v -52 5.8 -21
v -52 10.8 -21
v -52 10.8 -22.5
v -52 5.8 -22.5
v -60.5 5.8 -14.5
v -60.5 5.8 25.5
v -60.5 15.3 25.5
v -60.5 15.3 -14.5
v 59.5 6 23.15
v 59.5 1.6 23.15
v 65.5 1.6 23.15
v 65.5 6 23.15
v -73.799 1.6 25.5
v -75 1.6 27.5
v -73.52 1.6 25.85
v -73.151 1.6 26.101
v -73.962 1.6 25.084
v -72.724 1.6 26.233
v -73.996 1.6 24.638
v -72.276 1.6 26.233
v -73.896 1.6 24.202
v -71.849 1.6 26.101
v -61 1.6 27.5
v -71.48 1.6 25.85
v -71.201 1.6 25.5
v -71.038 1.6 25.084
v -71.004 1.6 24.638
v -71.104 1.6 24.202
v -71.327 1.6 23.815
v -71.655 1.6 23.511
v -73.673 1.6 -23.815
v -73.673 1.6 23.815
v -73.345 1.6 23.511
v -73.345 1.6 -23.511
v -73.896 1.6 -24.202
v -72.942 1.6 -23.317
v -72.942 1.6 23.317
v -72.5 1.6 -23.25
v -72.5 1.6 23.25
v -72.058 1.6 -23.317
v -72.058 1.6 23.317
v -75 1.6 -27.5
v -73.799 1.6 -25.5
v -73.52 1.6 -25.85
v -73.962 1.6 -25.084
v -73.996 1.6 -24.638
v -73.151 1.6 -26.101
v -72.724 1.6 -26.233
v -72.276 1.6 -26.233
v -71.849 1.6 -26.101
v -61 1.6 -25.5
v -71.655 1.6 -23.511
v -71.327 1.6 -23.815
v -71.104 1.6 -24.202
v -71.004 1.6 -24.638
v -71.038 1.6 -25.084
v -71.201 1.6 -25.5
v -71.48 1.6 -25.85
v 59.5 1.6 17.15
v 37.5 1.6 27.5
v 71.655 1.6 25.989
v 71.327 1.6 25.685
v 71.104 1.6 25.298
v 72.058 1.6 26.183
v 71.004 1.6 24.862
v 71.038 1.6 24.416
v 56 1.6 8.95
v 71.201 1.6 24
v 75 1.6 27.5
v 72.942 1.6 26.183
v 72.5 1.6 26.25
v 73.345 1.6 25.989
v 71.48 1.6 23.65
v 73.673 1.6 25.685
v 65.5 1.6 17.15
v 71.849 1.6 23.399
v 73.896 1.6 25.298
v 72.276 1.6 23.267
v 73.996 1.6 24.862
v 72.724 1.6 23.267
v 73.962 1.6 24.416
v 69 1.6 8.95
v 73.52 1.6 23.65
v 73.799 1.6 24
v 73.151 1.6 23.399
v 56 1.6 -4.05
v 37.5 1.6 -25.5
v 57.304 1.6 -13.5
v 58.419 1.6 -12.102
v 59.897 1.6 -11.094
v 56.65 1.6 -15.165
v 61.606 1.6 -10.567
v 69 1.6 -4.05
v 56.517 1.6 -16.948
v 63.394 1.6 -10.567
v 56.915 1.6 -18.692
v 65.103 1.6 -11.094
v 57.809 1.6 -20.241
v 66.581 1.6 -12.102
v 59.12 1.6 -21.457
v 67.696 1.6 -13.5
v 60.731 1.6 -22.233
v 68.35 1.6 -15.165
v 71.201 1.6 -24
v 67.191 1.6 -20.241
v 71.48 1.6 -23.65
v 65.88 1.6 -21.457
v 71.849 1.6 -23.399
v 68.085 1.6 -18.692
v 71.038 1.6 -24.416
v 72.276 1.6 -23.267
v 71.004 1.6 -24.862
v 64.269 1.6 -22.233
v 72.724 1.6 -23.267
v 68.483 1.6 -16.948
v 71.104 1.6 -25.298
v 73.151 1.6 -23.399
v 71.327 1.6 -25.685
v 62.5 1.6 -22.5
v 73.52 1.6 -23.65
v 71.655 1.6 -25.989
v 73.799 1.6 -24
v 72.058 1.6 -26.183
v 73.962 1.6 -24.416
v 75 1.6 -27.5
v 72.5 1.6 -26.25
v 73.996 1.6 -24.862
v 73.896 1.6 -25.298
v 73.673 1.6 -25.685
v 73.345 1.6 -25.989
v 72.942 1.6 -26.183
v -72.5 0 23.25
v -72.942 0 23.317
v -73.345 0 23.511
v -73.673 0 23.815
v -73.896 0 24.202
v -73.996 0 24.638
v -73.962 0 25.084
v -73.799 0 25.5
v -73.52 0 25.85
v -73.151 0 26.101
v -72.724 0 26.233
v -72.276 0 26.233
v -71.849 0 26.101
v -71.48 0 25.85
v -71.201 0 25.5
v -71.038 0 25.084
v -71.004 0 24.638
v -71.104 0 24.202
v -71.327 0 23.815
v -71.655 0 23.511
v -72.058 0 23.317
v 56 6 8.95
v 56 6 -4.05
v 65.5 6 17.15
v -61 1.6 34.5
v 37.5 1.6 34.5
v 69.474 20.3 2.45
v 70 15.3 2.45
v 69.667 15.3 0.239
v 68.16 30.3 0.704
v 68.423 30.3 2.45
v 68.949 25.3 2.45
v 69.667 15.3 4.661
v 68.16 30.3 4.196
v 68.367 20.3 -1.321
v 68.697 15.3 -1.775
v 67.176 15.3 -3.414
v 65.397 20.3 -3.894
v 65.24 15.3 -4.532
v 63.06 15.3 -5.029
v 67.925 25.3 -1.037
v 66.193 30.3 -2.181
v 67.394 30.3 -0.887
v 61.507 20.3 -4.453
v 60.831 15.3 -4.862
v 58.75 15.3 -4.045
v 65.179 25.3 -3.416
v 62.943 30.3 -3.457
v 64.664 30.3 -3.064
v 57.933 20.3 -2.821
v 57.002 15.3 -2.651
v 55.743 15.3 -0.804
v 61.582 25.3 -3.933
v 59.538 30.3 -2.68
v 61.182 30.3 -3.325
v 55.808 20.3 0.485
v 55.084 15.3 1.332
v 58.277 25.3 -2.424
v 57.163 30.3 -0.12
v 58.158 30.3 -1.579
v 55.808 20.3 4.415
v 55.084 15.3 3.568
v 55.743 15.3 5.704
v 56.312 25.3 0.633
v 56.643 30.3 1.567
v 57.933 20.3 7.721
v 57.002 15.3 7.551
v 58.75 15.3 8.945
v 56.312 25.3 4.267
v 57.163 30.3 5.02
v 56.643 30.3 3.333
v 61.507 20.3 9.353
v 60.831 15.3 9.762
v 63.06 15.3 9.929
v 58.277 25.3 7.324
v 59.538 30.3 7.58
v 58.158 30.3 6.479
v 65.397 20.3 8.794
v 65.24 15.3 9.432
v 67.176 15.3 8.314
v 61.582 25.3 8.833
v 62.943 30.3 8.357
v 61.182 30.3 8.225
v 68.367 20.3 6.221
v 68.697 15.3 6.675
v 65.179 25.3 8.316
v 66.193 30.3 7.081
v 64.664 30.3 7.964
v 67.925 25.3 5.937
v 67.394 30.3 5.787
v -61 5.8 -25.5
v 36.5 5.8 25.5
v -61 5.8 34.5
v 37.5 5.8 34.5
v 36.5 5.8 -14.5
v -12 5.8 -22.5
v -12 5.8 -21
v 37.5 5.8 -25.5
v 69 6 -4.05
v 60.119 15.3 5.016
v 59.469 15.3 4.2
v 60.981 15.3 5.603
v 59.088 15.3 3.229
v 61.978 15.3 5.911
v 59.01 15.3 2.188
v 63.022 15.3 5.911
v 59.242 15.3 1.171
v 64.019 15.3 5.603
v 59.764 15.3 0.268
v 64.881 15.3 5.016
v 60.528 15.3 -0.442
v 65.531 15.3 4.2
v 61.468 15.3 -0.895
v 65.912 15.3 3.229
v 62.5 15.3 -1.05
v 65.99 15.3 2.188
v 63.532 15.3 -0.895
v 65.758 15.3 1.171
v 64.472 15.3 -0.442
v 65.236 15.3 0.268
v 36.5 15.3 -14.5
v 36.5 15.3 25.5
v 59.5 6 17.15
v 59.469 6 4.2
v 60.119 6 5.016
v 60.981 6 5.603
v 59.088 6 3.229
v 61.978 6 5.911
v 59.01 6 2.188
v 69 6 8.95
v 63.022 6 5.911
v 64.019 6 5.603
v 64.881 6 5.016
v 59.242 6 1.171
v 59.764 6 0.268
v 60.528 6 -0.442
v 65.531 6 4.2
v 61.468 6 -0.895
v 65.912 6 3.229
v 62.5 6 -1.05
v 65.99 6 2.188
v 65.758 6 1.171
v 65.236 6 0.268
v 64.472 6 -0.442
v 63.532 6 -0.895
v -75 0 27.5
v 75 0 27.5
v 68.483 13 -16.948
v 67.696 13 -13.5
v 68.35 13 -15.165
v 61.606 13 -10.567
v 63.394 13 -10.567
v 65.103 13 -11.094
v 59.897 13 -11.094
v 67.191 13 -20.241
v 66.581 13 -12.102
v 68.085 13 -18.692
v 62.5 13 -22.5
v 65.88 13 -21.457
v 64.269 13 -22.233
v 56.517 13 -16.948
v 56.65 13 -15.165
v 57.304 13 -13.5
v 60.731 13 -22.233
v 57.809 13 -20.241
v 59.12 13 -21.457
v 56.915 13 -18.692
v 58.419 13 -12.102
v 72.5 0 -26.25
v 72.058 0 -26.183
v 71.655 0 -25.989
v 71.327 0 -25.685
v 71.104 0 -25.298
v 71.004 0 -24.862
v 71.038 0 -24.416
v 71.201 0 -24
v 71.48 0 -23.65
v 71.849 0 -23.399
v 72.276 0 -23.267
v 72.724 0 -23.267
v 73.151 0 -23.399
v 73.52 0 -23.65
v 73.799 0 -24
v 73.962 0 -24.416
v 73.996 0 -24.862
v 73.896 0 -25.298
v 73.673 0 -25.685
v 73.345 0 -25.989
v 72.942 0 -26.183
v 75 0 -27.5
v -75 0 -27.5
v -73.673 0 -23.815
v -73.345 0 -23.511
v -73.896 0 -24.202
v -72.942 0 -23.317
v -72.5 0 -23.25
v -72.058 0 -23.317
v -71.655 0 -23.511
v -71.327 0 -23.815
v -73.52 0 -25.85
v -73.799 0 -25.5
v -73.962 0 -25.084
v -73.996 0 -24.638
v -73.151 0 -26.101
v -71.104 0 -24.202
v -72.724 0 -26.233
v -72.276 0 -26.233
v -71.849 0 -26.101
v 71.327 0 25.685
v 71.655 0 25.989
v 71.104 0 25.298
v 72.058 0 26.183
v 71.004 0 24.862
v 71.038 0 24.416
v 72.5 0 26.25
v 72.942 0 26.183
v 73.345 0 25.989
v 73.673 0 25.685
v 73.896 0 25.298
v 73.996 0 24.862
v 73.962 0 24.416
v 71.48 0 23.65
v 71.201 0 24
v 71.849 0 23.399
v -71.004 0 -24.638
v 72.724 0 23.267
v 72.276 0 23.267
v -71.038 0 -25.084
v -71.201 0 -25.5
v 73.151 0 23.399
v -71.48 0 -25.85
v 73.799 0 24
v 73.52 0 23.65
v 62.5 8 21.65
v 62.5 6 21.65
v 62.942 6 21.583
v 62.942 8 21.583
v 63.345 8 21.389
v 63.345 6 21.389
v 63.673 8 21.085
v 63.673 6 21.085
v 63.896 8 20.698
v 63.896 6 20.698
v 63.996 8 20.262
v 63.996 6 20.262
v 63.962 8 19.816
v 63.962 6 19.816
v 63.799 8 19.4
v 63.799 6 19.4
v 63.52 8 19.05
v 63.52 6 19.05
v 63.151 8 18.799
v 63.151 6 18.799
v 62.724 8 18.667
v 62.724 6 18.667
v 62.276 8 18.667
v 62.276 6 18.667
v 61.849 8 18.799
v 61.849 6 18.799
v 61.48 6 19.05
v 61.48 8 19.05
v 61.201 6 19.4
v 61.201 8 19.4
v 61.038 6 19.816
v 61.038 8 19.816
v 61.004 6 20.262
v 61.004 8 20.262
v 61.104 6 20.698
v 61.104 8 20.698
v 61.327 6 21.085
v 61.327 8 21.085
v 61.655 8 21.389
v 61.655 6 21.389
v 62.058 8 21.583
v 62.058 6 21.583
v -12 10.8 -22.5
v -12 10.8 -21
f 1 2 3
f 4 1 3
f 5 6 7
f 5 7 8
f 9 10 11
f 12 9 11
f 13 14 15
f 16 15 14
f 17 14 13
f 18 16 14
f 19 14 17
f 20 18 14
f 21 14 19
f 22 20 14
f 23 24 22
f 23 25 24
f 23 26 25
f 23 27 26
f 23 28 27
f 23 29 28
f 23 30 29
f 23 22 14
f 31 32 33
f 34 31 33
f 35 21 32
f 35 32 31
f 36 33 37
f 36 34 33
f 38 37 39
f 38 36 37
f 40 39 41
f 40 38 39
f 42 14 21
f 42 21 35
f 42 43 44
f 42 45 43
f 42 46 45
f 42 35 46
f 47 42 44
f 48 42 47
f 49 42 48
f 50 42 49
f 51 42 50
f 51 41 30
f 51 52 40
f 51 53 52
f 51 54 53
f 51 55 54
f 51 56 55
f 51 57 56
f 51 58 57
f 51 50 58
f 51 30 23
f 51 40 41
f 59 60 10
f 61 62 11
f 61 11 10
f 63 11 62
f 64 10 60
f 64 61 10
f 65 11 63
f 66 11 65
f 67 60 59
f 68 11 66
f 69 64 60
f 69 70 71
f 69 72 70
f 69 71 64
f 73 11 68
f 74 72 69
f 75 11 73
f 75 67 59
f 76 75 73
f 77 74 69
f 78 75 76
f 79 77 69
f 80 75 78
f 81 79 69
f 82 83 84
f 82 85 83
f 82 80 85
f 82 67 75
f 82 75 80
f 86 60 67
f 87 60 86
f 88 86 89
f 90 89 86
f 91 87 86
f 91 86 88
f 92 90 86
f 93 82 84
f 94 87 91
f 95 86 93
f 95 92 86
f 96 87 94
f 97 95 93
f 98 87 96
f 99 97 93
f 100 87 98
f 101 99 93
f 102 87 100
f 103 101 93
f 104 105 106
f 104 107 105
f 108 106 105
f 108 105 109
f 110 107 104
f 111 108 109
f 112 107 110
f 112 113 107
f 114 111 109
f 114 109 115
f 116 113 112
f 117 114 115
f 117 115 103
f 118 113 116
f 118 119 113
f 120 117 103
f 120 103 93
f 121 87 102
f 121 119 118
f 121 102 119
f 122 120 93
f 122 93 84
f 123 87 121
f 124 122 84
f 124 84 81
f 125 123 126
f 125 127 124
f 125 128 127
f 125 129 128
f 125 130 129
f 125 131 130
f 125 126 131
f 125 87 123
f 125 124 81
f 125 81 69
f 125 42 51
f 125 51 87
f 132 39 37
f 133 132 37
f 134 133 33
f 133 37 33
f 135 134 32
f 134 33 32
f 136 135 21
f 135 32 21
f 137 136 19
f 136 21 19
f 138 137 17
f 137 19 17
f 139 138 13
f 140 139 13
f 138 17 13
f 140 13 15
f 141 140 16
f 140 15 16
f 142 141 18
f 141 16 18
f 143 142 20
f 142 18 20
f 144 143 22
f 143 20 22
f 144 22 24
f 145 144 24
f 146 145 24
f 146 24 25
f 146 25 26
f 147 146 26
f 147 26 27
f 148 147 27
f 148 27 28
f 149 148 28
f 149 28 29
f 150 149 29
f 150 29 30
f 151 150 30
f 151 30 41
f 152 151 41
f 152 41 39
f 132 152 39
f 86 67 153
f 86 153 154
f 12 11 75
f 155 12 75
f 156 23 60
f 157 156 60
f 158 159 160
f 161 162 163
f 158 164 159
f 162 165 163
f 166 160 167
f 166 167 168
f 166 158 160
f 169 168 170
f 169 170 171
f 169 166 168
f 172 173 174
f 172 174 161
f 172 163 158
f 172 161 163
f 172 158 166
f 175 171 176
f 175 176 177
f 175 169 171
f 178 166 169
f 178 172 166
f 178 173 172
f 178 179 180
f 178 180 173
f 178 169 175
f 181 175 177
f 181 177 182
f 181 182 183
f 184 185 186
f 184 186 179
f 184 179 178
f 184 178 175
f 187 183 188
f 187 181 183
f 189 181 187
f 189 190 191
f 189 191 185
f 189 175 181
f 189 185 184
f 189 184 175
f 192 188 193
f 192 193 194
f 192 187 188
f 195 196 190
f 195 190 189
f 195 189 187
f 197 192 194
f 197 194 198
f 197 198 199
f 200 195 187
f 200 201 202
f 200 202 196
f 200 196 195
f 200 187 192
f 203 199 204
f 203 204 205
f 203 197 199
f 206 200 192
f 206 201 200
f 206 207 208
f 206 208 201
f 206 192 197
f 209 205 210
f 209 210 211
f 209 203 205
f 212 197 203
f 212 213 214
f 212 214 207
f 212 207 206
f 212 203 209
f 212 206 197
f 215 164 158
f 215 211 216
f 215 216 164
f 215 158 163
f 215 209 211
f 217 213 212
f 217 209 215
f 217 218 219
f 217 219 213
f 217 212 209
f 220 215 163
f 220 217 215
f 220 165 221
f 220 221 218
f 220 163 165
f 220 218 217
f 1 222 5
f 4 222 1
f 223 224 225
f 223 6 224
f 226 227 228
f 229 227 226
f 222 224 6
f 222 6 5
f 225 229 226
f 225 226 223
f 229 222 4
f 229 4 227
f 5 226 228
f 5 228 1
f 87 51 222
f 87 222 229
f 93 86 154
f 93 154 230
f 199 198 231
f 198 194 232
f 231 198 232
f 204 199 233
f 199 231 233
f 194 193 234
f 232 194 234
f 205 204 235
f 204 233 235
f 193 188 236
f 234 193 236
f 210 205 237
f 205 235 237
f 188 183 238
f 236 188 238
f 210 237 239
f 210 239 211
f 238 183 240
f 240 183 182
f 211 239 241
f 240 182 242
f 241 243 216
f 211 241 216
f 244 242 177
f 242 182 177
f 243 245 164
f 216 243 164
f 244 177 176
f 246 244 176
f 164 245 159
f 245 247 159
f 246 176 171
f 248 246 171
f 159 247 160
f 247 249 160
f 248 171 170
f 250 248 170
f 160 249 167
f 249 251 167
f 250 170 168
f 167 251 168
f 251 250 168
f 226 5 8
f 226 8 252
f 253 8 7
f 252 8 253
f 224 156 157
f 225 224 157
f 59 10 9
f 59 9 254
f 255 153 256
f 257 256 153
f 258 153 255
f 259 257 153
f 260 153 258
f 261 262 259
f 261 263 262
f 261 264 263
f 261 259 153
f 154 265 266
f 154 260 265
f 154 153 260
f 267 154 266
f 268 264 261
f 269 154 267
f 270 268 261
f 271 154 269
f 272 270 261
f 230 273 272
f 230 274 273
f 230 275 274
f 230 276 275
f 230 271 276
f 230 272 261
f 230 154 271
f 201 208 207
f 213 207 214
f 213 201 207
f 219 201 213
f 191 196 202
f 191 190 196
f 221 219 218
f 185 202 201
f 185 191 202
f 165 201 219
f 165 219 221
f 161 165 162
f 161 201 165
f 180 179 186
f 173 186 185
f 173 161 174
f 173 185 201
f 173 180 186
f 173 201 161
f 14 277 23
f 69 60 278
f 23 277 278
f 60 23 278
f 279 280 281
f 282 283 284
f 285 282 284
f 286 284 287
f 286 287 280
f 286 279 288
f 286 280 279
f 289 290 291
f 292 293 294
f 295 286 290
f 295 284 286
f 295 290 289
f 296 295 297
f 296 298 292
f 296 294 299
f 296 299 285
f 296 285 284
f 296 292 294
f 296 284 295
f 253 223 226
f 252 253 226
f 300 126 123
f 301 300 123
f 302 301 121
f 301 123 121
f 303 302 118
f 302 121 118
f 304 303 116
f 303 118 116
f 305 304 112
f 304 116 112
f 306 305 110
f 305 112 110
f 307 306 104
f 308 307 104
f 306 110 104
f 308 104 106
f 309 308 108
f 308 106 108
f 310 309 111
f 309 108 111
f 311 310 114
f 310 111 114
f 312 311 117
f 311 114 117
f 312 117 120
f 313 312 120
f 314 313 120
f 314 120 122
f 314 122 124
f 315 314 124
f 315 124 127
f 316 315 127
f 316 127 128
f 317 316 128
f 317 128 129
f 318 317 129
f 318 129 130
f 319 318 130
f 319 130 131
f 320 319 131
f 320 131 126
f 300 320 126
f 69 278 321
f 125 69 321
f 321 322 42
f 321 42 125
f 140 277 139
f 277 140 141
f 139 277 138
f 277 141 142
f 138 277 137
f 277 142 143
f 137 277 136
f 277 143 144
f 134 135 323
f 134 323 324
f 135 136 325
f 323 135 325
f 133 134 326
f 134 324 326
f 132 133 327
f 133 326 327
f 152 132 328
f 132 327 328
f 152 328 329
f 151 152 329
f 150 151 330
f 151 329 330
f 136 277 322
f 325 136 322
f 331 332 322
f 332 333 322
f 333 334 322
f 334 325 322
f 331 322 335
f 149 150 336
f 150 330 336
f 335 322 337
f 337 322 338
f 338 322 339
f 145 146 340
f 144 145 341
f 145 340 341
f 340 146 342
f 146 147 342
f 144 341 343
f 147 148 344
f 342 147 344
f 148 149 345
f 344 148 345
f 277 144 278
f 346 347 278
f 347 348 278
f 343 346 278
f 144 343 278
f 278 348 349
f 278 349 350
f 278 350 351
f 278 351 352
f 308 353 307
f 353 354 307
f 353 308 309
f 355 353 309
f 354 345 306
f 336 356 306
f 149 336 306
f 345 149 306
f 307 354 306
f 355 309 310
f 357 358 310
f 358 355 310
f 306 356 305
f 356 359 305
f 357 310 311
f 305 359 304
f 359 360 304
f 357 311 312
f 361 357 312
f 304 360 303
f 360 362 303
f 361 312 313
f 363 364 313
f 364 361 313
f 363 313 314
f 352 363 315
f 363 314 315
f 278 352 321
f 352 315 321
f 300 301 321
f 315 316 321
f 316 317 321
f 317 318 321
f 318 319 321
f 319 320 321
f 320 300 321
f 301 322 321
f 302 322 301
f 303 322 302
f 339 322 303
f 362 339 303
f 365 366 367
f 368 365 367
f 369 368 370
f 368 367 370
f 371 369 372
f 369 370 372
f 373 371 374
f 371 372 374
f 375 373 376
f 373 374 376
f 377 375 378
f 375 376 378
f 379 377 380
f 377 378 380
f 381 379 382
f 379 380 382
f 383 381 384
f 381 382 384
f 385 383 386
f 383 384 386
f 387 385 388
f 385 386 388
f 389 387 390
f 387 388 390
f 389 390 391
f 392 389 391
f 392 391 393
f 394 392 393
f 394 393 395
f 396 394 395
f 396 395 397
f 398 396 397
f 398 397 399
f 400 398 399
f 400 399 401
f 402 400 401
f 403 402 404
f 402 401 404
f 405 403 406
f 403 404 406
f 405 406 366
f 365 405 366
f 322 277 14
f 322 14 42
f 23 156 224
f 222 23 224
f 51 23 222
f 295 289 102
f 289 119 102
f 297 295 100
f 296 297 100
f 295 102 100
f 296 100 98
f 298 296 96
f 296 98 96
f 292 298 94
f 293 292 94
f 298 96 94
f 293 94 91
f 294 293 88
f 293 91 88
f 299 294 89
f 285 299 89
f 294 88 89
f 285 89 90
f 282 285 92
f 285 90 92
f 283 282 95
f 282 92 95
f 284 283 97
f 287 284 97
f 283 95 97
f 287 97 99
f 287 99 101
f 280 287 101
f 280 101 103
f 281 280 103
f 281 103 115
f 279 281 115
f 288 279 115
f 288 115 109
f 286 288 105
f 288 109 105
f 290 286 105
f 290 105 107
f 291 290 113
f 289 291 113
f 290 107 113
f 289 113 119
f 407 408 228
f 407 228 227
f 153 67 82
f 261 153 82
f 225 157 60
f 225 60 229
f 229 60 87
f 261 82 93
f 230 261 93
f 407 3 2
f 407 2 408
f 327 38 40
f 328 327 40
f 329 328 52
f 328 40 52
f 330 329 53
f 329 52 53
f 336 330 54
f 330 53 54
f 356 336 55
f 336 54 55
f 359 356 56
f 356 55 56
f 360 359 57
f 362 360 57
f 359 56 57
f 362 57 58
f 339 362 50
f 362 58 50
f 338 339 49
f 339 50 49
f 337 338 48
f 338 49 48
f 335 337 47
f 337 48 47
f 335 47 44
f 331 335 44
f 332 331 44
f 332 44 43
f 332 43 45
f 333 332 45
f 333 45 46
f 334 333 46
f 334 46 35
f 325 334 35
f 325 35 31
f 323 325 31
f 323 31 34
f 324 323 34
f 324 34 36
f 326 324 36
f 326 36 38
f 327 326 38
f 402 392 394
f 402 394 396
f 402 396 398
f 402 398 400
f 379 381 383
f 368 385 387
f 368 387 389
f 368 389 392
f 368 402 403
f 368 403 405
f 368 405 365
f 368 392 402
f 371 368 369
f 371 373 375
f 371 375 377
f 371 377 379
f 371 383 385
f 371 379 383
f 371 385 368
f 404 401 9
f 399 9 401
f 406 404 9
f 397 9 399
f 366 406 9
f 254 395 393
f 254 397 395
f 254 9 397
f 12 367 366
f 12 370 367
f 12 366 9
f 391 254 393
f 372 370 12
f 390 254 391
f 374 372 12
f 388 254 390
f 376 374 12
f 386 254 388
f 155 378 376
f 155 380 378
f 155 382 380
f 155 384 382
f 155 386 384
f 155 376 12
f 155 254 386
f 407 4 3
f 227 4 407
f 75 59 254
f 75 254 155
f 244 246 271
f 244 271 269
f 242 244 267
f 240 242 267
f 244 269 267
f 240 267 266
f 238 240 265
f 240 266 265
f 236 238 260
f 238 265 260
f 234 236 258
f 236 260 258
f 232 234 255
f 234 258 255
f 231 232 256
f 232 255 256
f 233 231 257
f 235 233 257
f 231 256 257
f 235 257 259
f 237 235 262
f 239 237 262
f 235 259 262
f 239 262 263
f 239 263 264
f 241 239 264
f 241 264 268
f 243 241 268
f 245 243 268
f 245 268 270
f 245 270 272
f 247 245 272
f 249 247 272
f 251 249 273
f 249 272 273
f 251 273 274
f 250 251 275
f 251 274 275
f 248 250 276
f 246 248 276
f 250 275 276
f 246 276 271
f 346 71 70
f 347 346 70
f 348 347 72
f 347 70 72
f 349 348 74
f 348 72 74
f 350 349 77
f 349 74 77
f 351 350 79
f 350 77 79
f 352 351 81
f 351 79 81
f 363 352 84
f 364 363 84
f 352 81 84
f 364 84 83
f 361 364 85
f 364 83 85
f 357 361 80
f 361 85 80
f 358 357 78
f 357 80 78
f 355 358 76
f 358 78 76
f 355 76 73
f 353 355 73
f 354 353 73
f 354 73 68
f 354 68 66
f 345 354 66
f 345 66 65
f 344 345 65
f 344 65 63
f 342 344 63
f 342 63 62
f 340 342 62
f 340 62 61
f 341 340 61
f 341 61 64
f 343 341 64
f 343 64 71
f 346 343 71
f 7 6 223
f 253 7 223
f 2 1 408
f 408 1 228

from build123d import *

# Parameters (mm, degrees)
SKETCH1_W                  = 150
SKETCH1_H                  = 55
MAINPCB_DEPTH              = 1.6
SKETCH2_R                  = 1.5
SCREWHOLES_DEPTH           = 80.898748426
SKETCH3_W                  = 98.5
SKETCH3_H                  = 60
BOSS_EXTRUDE2_DEPTH        = 4.2
SKETCH4_W                  = 97
SKETCH4_H                  = 40
BOSS_EXTRUDE3_DEPTH        = 9.5
SKETCH5_R                  = 6
SKETCH5_W                  = 13
SKETCH5_H                  = 13
SKETCH5_W_2                = 6
SKETCH5_H_2                = 6
BOSS_EXTRUDE4_DEPTH        = 4.4
SKETCH6_R                  = 1.5
BOSS_EXTRUDE5_DEPTH        = 2
SKETCH7_R                  = 6
BOSS_EXTRUDE6_DEPTH        = 7
SKETCH8_R                  = 3.5
BOSS_EXTRUDE7_DEPTH        = 9.3
SKETCH9_R                  = 7.5
BOSS_EXTRUDE8_DEPTH        = 15
BOSS_EXTRUDE8_TAPER        = 6
SKETCH10_W                 = 40
SKETCH10_H                 = 1.5
ANNOYINGLYPLACEDPINS_DEPTH = 5


with BuildPart() as part:
    # Sketch1 → MainPCB (new body)
    with BuildSketch(Plane(origin=(0, 0, 0), x_dir=(1, 0, 0), z_dir=(0, 1, 0))):
        Rectangle(SKETCH1_W, SKETCH1_H)
    extrude(amount=MAINPCB_DEPTH)

    # Sketch2 → ScrewHoles (cut, through all)
    with BuildSketch(Plane(origin=(0, 1.6, 0), x_dir=(1, 0, 0), z_dir=(0, 1, 0))):
        with Locations(Location((-72.5, 24.75, 0), (0, 0, 270))):
            Circle(SKETCH2_R)
        with Locations(Location((-72.5, -24.75, 0), (0, 0, 90))):
            Circle(SKETCH2_R)
        with Locations(Location((72.5, -24.75, 0), (0, 0, 270))):
            Circle(SKETCH2_R)
        with Locations(Location((72.5, 24.75, 0), (0, 0, 90))):
            Circle(SKETCH2_R)
    extrude(amount=-SCREWHOLES_DEPTH, mode=Mode.SUBTRACT)

    # Sketch3 → Boss-Extrude2 (add)
    with BuildSketch(Plane(origin=(0, 1.6, 0), x_dir=(1, 0, 0), z_dir=(0, 1, 0))):
        with Locations((-11.75, -4.5)):
            Rectangle(SKETCH3_W, SKETCH3_H)
    extrude(amount=BOSS_EXTRUDE2_DEPTH)

    # Sketch4 → Boss-Extrude3 (add)
    with BuildSketch(Plane(origin=(0, 5.8, 0), x_dir=(1, 0, 0), z_dir=(0, 1, 0))):
        with Locations((-12, -5.5)):
            Rectangle(SKETCH4_W, SKETCH4_H)
    extrude(amount=BOSS_EXTRUDE3_DEPTH)

    # Sketch5 → Boss-Extrude4 (add)
    with BuildSketch(Plane(origin=(0, 1.6, 0), x_dir=(1, 0, 0), z_dir=(0, 1, 0))):
        with Locations(Location((62.5, 16.5, 0), (0, 0, 90))):
            Circle(SKETCH5_R)
        with Locations((62.5, -2.45)):
            Rectangle(SKETCH5_W, SKETCH5_H)
        with Locations((62.5, -20.15)):
            Rectangle(SKETCH5_W_2, SKETCH5_H_2)
    extrude(amount=BOSS_EXTRUDE4_DEPTH)

    # Sketch6 → Boss-Extrude5 (add)
    with BuildSketch(Plane(origin=(0, 6, 0), x_dir=(1, 0, 0), z_dir=(0, 1, 0))):
        with Locations(Location((62.5, -20.15, 0), (0, 0, 270))):
            Circle(SKETCH6_R)
    extrude(amount=BOSS_EXTRUDE5_DEPTH)

    # Sketch7 → Boss-Extrude6 (add)
    with BuildSketch(Plane(origin=(0, 6, 0), x_dir=(1, 0, 0), z_dir=(0, 1, 0))):
        with Locations(Location((62.5, 16.5, 0), (0, 0, 90))):
            Circle(SKETCH7_R)
    extrude(amount=BOSS_EXTRUDE6_DEPTH)

    # Sketch8 → Boss-Extrude7 (add)
    with BuildSketch(Plane(origin=(0, 6, 0), x_dir=(1, 0, 0), z_dir=(0, 1, 0))):
        with Locations(Location((62.5, -2.45, 0), (0, 0, 90))):
            Circle(SKETCH8_R)
    extrude(amount=BOSS_EXTRUDE7_DEPTH)

    # Sketch9 → Boss-Extrude8 (add)
    with BuildSketch(Plane(origin=(0, 15.3, 0), x_dir=(1, 0, 0), z_dir=(0, 1, 0))):
        with Locations((62.5, -2.45)):
            Circle(SKETCH9_R)
    extrude(amount=BOSS_EXTRUDE8_DEPTH, taper=BOSS_EXTRUDE8_TAPER)

    # Sketch10 → AnnoyinglyPlacedPins (add)
    with BuildSketch(Plane(origin=(0, 5.8, 0), x_dir=(1, 0, 0), z_dir=(0, 1, 0))):
        with Locations((-32, 21.75)):
            Rectangle(SKETCH10_W, SKETCH10_H)
    extrude(amount=ANNOYINGLYPLACEDPINS_DEPTH)


solid = part.part
